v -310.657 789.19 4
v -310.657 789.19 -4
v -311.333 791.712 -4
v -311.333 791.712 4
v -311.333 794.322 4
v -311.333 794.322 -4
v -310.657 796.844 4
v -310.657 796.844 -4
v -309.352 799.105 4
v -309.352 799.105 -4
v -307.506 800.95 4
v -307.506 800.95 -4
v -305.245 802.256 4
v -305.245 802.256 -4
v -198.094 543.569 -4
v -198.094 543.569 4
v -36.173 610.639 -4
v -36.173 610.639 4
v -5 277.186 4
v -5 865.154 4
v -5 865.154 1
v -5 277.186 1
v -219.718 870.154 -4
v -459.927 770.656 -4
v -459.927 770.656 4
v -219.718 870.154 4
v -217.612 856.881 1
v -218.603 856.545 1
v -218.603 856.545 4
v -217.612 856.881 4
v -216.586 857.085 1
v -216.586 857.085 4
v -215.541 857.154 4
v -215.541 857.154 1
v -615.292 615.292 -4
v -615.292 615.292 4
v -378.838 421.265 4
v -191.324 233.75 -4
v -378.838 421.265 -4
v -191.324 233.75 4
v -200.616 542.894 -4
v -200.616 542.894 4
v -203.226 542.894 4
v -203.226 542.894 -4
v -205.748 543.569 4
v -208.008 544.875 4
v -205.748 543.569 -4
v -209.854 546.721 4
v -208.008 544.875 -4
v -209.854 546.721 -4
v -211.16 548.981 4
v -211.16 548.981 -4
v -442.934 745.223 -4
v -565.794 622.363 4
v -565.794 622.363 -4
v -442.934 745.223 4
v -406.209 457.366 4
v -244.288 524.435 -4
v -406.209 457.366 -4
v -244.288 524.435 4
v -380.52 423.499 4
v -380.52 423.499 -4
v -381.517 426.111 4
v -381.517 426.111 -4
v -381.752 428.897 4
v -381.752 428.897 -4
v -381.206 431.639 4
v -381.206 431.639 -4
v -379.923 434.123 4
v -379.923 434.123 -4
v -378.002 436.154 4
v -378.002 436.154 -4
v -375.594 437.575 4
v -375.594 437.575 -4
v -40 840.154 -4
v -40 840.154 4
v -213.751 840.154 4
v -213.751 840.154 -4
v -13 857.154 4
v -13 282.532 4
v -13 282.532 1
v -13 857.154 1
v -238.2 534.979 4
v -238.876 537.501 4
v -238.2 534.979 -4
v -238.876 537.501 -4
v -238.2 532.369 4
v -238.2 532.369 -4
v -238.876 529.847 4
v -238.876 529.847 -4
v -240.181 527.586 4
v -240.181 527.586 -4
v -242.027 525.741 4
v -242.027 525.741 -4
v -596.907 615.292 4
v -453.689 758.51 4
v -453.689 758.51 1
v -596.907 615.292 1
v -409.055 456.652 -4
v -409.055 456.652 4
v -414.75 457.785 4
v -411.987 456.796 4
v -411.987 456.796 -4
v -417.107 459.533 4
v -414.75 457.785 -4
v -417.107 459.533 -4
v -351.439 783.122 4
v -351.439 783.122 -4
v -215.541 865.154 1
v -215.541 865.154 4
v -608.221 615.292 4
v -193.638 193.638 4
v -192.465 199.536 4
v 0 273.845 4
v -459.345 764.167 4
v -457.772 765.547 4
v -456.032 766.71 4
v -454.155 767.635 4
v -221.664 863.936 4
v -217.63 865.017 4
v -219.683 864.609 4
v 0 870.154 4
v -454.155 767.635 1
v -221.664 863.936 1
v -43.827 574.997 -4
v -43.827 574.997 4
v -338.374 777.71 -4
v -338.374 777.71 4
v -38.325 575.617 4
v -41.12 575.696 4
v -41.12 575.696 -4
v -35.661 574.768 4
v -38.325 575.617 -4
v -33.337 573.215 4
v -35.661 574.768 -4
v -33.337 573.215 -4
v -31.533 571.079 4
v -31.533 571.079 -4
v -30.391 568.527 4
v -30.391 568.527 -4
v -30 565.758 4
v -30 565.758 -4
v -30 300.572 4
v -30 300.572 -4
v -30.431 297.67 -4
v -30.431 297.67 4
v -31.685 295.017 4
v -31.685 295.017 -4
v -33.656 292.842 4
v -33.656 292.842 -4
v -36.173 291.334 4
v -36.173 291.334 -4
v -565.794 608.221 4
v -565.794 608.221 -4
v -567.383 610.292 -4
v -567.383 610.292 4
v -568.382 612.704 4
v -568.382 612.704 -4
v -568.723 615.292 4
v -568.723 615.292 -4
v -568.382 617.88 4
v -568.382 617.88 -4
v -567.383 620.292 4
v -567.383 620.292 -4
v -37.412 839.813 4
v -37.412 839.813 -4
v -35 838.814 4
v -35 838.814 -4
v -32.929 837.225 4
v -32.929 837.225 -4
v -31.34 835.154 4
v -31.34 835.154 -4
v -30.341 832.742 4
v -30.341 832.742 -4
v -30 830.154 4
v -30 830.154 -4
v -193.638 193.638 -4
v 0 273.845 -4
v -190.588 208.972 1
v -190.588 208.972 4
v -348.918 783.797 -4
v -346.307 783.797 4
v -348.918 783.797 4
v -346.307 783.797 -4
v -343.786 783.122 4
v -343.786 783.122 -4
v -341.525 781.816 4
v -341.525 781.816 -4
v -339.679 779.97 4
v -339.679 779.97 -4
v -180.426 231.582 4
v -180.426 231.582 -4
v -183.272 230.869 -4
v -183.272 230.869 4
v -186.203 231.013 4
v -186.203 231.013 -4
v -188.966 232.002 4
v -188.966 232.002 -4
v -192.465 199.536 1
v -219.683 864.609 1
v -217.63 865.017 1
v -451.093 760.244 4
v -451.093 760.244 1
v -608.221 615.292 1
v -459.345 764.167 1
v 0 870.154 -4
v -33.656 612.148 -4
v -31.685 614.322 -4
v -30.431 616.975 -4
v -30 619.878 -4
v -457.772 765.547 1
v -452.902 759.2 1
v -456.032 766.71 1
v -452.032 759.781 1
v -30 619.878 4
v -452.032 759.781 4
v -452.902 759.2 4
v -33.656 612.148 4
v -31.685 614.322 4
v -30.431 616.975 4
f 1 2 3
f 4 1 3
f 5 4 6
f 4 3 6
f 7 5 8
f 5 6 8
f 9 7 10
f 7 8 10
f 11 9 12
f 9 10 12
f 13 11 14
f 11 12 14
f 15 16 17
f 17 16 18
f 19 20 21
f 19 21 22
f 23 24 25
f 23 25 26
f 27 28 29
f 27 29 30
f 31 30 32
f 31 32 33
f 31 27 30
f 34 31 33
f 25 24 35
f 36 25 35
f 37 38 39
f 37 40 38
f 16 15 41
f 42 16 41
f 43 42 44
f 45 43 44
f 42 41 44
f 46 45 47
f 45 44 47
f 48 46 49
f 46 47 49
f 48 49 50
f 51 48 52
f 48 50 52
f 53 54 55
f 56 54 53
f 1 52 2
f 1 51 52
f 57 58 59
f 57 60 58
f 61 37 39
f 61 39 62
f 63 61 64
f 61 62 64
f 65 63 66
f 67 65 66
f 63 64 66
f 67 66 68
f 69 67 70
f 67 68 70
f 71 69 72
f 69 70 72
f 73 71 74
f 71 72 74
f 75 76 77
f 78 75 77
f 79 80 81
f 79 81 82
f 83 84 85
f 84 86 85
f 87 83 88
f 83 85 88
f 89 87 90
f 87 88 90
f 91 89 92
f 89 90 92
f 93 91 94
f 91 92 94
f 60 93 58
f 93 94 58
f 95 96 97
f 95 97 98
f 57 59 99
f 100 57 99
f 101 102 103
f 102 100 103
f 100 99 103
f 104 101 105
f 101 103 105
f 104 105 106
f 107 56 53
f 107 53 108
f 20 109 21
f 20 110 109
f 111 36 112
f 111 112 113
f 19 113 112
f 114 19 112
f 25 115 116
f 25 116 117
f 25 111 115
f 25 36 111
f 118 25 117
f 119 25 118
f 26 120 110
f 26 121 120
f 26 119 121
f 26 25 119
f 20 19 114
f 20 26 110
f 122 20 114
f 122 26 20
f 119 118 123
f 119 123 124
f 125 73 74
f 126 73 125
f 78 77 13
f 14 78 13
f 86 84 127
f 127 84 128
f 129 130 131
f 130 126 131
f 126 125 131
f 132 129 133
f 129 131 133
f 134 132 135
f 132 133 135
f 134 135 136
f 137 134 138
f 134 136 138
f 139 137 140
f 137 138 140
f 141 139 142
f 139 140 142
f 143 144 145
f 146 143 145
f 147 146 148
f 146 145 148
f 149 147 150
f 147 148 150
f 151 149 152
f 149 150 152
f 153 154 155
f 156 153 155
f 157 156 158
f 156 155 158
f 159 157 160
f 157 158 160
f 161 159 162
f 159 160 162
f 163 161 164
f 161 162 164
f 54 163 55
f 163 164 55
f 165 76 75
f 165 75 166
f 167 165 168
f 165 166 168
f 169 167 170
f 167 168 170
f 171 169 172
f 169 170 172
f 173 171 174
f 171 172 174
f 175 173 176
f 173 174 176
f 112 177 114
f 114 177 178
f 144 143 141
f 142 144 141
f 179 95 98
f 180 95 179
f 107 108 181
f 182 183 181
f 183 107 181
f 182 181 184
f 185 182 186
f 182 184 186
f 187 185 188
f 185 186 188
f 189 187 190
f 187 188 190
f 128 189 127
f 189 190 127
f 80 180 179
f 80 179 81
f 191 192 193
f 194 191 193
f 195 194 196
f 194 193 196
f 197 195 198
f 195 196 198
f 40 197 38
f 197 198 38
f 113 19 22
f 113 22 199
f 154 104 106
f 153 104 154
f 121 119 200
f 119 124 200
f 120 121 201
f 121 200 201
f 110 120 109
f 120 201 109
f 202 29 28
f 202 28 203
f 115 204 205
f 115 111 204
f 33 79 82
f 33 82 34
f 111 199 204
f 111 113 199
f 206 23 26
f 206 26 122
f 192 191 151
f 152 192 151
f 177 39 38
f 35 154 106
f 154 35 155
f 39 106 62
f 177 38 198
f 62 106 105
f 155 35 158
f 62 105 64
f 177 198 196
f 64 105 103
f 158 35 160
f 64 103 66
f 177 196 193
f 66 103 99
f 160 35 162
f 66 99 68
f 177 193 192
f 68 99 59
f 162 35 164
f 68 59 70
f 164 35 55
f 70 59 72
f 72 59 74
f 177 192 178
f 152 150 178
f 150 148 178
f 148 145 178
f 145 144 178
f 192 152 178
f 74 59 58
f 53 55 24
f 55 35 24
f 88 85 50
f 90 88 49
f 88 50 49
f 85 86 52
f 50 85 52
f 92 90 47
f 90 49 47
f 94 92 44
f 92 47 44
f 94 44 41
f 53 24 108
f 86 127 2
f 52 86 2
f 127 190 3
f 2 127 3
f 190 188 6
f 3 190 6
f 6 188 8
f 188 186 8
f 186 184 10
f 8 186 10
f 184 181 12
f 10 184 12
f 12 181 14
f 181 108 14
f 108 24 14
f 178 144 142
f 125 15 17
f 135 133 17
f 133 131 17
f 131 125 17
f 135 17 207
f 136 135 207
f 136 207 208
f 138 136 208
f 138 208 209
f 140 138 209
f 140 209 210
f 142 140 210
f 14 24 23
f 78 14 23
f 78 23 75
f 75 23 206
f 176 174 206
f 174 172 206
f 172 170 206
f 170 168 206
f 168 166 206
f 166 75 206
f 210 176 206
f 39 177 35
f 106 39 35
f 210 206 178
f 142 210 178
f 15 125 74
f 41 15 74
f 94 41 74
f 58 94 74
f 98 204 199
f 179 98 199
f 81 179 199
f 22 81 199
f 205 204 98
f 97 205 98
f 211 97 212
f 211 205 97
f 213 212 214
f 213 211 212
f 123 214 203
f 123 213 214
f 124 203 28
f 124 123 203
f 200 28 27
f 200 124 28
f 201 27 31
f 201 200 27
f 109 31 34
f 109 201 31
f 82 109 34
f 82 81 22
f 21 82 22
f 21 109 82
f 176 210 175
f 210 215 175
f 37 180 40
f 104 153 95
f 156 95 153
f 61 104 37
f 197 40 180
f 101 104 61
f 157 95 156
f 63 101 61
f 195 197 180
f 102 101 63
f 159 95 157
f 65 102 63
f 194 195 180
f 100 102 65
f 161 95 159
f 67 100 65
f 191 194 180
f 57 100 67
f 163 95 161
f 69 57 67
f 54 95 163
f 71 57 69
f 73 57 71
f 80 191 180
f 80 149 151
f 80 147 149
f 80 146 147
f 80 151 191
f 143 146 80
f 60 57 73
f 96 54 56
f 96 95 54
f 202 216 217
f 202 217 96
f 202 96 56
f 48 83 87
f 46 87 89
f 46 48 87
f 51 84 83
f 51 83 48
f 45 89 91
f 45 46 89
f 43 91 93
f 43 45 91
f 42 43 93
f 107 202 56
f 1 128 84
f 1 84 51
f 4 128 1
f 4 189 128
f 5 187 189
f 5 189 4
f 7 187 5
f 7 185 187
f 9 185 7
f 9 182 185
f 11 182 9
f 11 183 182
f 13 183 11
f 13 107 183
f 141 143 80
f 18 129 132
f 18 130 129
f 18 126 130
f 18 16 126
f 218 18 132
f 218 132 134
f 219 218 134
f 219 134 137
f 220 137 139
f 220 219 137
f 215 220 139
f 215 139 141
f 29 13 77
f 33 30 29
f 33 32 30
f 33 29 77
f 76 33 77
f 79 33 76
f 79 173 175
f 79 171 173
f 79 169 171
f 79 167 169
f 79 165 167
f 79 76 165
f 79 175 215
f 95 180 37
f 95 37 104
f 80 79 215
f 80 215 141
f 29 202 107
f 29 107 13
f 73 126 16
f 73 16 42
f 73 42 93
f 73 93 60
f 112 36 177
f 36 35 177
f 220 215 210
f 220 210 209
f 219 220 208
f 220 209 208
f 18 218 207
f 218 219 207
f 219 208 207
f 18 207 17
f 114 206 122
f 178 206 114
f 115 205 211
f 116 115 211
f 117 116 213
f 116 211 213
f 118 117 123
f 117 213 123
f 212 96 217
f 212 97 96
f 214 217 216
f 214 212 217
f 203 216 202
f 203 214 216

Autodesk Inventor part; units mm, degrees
ref_plane "YZ Plane" through (0, 0, 0) normal (1, 0, 0) x (0, 1, 0)
ref_plane "XZ Plane" through (0, 0, 0) normal (0, 1, 0) x (-1, 0, 0)
ref_plane "XY Plane" through (0, 0, 0) normal (0, 0, 1) x (1, 0, 0)
sketch "Sketch1" plane through (0, 0, 0) normal (0, 0, 1) x (1, 0, 0)
  line L0 (0, 273.8452) -> (193.6378, 193.6378) construction
  line L1 (193.6378, 193.6378) -> (273.8452, 0) construction
  line L2 (273.8452, 0) -> (193.6378, -193.6378) construction
  line L3 (193.6378, -193.6378) -> (0, -273.8452) construction
  line L4 (0, -273.8452) -> (-193.6378, -193.6378) construction
  line L5 (-193.6378, -193.6378) -> (-273.8452, 0) construction
  line L6 (-273.8452, 0) -> (-193.6378, 193.6378) construction
  line L7 (-193.6378, 193.6378) -> (0, 273.8452)
  line L8 (-193.6378, 193.6378) -> (0, 273.8452)
  line L9 (-459.9272, 770.6562) -> (-219.7185, 870.1539)
  line L10 (-96.8189, 233.7415) -> (-339.8229, 820.405) construction
  line L11 (-219.7185, 870.1539) -> (0, 870.1539)
  line L12 (0, 870.1539) -> (0, 273.8452)
  line L13 (-459.9272, 770.6562) -> (-615.2917, 615.2917)
  line L14 (-615.2917, 615.2917) -> (-193.6378, 193.6378)
  point P0 (0, 0)
  point P1 (0, 0)
  dimension "d0" = 506
  dimension "d2" = 260
  dimension "d3" = 635
extrude "Extrusion1" add sketch "Sketch1" along normal mid plane 8
sketch "Sketch2" plane through (0, 0, 4) normal (0, 0, 1) x (1, 0, 0)
  line L0 (-219.7185, 870.1539) -> (-459.9272, 770.6562) projected
  line L1 (-459.9272, 770.6562) -> (-615.2917, 615.2917) projected
  line L2 (-235.0492, 528.2621) -> (-412.382, 454.8085)
  line L3 (-193.6378, 193.6378) -> (0, 273.8452) projected
  line L4 (-96.8189, 233.7415) -> (-339.8229, 820.405) construction
  line L5 (-615.2917, 615.2917) -> (-193.6378, 193.6378) projected
  line L6 (-412.382, 454.8085) -> (-572.8653, 615.2917)
  line L7 (-572.8653, 615.2917) -> (-442.9336, 745.2234)
  line L8 (-442.9336, 745.2234) -> (-342.2006, 786.9484)
  line L9 (-235.0492, 528.2621) -> (-342.2006, 786.9484)
  line L10 (-207.3328, 539.7426) -> (-30, 613.1963)
  line L11 (-30, 613.1963) -> (-30, 840.1539)
  line L12 (-30, 840.1539) -> (-213.7512, 840.1539)
  line L13 (-213.7512, 840.1539) -> (-314.4842, 798.4289)
  line L14 (-207.3328, 539.7426) -> (-314.4842, 798.4289)
  line L15 (0, 273.8452) -> (0, 870.1539) projected
  line L16 (-412.382, 454.8085) -> (-30, 613.1963) construction
  line L17 (-389.421, 431.8474) -> (-30, 580.7245)
  line L18 (-186.5988, 229.0252) -> (-30, 293.8906)
  line L19 (-30, 293.8906) -> (-30, 580.7245)
  line L20 (-186.5988, 229.0252) -> (-389.421, 431.8474)
  point P0 (0, 0)
  dimension "d11" = 30
  dimension "d12" = 280
  dimension "d13" = 30
  dimension "d14" = 30
  dimension "d15" = 15
  dimension "d21" = 30
  dimension "d22" = 30
  dimension "d23" = 30
  dimension "d24" = 30
extrude "Extrusion2" cut sketch "Sketch2" against normal up to surface (8 mm away)
fillet "Fillet1" radius 10 12 edges at (-572.8653, 615.2917, 0) (-342.2006, 786.9484, 0) (-235.0492, 528.2621, 0) (-412.382, 454.8085, 0) (-314.4842, 798.4289, 0) (-30, 840.1539, 0) (-30, 613.1963, 0) (-207.3328, 539.7426, 0) (-389.421, 431.8474, 0) (-30, 580.7245, 0) (-30, 293.8906, 0) (-186.5988, 229.0252, 0)
sketch "Sketch4" plane through (0, 0, 4) normal (0, 0, 1) x (1, 0, 0)
  line L0 (-219.7185, 870.1539) -> (-459.9272, 770.6562) projected
  line L1 (0, 870.1539) -> (-219.7185, 870.1539) projected
  line L2 (-459.9272, 770.6562) -> (-615.2917, 615.2917) projected
  line L3 (-615.2917, 615.2917) -> (-193.6378, 193.6378) projected
  line L4 (-193.6378, 193.6378) -> (0, 273.8452) projected
  line L5 (0, 273.8452) -> (0, 870.1539) projected
  line L6 (-457.095, 766.4174) -> (-218.724, 865.1539)
  line L7 (-218.724, 865.1539) -> (-5, 865.1539)
  line L8 (-5, 865.1539) -> (-5, 277.1861)
  line L9 (-5, 277.1861) -> (-192.4647, 199.5357)
  line L10 (-192.4647, 199.5357) -> (-608.2206, 615.2917)
  line L11 (-608.2206, 615.2917) -> (-457.095, 766.4174)
  line L12 (-217.1327, 857.1539) -> (-452.5633, 759.6353)
  line L13 (-452.5633, 759.6353) -> (-596.9069, 615.2917)
  line L14 (-596.9069, 615.2917) -> (-190.5876, 208.9724)
  line L15 (-190.5876, 208.9724) -> (-13, 282.5315)
  line L16 (-13, 282.5315) -> (-13, 857.1539)
  line L17 (-13, 857.1539) -> (-217.1327, 857.1539)
  point P0 (0, 0)
  dimension "d26" = 5
  dimension "d27" = 8
extrude "Extrusion3" cut sketch "Sketch4" against normal blind 3 contours L6 L7 L8 L9 L10 L11
fillet "Fillet3" radius 16 2 edges at (-218.724, 865.1539, 2.5) (-457.095, 766.4174, 2.5)
fillet "Fillet4" radius 8 2 edges at (-452.5633, 759.6353, 2.5) (-217.1327, 857.1539, 2.5)
equation "\"d0\" = Барабан_габарит_по_кассетам"
equation "\"d2\" = Кассета_длина_грани"
equation "\"d3\" = Кассета_высота"
equation "\"d11\" = d13"
equation "\"d14\" = d13"
equation "\"d15\" = 0.5 * d13"
equation "\"d21\" = d13"
equation "\"d22\" = d13"
equation "\"d23\" = d13"
equation "\"d24\" = d13"
equation "\"Барабан_габарит_по_кассетам\" = 506"
equation "\"Кассета_длина_грани\" = 260"
equation "\"Кассета_высота\" = 635"
properties part number "ДМС 201 Внешняя рамка"
